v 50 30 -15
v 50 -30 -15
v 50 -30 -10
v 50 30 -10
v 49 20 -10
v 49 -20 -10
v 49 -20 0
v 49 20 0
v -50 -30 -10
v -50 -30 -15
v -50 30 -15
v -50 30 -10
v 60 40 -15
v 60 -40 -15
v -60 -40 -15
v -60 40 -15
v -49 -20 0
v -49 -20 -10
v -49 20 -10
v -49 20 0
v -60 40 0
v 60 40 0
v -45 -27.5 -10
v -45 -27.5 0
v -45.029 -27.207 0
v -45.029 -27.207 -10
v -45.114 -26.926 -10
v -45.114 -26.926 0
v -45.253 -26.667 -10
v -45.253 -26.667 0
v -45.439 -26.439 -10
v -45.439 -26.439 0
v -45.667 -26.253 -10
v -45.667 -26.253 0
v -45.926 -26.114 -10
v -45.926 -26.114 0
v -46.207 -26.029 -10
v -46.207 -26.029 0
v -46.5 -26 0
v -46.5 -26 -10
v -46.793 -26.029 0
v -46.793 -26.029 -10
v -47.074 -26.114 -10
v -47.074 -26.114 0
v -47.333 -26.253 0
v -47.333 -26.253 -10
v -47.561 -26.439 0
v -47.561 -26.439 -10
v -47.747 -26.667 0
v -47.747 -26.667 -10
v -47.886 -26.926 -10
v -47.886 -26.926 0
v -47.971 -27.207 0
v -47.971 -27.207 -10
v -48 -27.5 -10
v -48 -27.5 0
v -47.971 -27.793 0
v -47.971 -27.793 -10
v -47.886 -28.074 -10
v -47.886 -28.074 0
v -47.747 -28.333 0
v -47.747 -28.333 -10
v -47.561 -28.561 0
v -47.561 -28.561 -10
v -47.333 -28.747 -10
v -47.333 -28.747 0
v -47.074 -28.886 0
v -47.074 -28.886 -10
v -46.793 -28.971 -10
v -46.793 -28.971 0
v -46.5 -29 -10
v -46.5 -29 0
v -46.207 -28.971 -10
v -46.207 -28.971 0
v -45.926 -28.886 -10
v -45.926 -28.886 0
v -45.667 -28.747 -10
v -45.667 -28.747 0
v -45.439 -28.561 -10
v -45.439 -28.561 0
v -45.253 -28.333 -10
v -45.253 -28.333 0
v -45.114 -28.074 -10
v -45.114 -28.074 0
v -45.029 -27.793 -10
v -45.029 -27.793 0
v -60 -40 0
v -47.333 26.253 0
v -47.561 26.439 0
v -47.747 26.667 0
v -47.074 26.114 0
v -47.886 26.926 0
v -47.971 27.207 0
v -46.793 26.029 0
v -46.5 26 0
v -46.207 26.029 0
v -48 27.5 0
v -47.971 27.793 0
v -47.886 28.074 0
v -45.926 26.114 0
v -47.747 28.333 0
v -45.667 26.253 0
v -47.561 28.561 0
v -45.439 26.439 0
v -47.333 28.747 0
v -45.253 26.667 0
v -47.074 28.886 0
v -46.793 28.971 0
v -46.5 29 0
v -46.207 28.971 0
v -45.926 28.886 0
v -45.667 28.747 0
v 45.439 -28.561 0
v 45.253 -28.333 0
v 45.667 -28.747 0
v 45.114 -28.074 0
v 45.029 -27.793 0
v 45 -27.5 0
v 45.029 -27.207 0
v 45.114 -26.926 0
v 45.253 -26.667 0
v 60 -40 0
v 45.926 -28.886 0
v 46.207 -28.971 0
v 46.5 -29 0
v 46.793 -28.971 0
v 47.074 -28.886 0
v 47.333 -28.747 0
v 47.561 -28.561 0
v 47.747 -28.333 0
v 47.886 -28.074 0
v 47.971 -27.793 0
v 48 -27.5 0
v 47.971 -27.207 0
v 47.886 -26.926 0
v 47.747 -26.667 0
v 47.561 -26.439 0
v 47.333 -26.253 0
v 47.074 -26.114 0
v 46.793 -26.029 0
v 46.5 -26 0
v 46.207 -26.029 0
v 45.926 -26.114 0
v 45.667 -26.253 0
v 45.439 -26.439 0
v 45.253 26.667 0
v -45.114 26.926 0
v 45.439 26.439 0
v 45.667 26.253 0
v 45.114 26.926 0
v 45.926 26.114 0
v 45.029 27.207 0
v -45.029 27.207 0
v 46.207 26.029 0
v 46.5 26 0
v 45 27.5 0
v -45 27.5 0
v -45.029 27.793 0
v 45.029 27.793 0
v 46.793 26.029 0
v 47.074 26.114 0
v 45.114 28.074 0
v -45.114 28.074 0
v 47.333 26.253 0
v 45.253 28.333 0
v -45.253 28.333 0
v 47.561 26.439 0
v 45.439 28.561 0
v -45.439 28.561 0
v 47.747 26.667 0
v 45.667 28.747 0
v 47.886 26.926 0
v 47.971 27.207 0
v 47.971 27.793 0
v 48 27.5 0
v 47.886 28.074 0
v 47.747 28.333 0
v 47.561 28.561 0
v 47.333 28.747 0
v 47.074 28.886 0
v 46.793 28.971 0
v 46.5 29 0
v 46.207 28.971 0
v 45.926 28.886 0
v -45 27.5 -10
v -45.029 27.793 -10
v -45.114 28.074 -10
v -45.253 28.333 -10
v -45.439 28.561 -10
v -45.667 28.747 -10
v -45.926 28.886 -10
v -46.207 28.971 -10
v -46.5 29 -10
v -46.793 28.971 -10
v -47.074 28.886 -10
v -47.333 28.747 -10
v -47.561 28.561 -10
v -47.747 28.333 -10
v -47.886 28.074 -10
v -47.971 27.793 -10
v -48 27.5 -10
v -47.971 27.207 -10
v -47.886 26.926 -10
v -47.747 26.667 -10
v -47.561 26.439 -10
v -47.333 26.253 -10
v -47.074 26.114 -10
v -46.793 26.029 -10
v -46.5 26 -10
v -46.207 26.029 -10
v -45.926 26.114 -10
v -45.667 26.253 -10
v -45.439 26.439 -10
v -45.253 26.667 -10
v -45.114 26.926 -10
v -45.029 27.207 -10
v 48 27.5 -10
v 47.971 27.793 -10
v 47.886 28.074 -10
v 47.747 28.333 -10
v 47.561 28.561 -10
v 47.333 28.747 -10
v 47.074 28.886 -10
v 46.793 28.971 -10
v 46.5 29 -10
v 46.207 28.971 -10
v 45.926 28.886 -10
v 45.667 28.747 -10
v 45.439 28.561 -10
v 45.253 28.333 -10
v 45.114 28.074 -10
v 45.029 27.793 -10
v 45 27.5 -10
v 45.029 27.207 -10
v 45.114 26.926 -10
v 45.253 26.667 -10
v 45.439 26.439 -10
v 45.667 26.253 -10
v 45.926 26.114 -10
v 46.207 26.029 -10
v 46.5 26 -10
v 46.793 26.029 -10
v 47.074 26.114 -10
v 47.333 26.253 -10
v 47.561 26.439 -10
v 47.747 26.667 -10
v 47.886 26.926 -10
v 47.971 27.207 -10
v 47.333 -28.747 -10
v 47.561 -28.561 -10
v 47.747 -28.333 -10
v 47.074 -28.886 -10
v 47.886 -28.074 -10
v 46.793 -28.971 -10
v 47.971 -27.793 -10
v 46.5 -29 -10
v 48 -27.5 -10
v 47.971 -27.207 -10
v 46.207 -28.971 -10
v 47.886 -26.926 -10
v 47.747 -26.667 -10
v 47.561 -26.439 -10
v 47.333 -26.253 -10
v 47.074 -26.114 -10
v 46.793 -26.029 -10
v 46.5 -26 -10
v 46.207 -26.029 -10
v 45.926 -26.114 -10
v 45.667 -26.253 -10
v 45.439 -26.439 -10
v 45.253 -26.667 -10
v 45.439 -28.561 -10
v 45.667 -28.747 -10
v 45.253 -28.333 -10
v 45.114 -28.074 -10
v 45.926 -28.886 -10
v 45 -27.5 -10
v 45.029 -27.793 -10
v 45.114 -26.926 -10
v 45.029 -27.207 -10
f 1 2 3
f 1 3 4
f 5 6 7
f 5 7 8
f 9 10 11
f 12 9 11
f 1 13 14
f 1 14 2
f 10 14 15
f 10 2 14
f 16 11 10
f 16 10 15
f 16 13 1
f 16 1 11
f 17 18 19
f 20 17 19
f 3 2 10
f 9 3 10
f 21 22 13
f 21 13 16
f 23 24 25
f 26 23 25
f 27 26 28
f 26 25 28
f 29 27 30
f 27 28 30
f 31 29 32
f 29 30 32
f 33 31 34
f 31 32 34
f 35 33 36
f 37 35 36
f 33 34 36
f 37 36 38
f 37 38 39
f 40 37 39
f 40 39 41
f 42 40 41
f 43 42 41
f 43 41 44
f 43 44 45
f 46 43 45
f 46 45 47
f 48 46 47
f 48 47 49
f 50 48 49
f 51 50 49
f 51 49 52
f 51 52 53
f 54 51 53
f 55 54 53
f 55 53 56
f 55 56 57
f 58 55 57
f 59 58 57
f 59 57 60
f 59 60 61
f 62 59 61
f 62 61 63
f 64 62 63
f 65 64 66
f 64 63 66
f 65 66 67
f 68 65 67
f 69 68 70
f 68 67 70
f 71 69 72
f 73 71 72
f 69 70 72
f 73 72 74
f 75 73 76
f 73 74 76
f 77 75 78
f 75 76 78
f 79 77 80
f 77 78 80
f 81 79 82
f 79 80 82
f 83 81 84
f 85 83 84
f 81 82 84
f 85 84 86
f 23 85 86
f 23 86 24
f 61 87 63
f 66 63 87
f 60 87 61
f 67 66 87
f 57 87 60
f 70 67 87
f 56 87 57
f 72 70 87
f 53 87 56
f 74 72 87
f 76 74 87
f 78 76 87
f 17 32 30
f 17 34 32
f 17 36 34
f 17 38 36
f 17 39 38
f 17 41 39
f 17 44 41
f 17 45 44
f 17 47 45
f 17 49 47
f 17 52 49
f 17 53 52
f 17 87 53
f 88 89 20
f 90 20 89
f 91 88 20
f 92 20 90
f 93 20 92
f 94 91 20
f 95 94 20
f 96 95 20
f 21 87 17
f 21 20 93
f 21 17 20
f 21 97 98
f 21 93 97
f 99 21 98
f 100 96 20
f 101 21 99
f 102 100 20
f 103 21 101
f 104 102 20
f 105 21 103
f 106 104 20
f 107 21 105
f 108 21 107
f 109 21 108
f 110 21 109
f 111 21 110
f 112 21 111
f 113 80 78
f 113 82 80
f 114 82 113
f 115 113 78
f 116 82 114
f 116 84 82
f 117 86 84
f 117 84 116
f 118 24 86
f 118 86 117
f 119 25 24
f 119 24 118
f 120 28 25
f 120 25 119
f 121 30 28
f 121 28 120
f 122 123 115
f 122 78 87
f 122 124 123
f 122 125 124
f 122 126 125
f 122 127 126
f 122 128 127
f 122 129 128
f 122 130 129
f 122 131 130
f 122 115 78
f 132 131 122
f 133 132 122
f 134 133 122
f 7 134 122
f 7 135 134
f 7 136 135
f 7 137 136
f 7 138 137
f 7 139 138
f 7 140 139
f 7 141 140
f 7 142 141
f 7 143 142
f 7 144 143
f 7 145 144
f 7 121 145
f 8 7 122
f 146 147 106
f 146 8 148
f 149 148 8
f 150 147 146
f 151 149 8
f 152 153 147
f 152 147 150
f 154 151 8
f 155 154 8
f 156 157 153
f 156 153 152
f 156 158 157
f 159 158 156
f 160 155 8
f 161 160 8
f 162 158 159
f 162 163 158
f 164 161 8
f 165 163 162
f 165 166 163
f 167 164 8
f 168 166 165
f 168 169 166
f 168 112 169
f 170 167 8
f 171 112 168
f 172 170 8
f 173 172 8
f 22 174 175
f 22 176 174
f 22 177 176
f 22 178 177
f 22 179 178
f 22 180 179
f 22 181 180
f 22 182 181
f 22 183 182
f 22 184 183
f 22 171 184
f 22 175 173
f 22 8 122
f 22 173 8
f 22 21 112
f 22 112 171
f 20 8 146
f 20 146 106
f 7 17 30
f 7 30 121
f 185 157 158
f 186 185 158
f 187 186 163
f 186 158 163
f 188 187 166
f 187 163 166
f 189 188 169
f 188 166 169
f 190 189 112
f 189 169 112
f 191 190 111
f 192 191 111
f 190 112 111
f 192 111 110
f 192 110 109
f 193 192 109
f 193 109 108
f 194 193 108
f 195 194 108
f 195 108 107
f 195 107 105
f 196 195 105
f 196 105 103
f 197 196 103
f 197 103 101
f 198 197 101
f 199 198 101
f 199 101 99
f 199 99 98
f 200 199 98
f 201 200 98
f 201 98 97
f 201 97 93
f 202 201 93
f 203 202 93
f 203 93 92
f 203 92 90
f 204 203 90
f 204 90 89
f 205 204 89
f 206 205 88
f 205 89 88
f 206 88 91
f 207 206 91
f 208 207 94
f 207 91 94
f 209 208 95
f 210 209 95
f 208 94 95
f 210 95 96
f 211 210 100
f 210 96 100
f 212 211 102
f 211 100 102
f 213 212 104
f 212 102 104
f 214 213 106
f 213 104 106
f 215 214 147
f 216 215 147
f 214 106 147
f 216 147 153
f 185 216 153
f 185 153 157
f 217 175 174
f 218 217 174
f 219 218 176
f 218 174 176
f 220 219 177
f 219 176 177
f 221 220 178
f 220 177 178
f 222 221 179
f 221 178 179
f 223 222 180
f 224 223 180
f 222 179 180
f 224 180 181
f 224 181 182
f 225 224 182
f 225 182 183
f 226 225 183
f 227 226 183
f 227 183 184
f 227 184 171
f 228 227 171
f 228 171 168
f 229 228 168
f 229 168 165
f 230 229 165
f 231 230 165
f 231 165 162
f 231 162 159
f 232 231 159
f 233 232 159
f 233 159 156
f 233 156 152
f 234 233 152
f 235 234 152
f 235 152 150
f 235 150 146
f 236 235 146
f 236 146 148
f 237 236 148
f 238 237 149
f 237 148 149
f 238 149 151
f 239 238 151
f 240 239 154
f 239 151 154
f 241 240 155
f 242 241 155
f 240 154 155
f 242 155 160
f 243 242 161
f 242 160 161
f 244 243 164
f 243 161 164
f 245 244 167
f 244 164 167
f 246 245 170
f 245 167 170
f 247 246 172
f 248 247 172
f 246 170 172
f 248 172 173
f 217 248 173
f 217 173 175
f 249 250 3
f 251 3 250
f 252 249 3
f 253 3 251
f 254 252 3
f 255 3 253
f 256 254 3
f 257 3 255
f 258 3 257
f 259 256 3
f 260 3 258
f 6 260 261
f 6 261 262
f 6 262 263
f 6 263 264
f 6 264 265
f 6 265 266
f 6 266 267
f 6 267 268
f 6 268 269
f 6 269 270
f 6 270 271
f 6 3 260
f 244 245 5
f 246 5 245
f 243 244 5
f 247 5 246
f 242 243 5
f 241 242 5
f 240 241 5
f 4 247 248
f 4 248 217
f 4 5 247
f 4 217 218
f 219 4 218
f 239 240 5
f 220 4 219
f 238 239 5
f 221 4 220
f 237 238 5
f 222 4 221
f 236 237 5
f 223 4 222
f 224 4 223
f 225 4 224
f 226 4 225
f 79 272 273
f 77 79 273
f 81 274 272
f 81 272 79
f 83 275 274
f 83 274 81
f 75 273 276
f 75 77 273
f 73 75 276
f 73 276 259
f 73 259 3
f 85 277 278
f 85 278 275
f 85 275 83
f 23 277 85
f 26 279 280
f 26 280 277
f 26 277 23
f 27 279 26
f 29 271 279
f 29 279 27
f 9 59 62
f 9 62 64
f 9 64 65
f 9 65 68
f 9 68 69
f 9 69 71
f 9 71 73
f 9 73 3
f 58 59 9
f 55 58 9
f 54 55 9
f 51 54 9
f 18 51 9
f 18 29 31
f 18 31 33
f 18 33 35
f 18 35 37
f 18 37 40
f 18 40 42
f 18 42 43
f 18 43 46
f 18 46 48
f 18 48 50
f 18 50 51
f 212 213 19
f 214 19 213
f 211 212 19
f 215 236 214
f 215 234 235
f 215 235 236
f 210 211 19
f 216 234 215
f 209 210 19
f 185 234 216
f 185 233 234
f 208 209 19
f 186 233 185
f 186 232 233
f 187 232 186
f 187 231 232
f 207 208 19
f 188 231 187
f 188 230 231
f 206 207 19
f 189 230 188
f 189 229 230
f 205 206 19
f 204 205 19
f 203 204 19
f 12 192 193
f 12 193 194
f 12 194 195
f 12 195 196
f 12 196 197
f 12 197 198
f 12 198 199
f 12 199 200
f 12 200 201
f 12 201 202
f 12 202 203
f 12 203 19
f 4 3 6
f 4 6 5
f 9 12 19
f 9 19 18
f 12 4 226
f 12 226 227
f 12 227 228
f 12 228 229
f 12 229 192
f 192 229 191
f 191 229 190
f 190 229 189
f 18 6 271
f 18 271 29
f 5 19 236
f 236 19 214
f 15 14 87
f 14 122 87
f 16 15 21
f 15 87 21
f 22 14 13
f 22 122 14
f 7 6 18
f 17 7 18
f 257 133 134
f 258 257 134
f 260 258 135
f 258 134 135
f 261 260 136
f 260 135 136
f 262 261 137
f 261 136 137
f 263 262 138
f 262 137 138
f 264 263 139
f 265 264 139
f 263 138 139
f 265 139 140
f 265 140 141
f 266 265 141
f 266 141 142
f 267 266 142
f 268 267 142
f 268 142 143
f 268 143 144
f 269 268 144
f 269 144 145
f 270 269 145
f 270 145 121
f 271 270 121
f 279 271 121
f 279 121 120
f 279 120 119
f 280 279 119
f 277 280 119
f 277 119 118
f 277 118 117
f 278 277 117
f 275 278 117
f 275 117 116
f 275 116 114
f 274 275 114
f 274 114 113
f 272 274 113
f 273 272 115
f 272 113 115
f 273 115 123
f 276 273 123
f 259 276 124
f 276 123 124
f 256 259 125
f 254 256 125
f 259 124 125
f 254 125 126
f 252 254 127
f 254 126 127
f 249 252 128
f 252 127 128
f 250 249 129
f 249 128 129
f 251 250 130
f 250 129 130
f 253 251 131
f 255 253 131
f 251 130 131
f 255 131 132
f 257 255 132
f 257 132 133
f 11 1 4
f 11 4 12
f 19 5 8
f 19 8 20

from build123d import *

# Parameters (mm, degrees)
SKETCH1_W           = 120
SKETCH1_H           = 80
BOSS_EXTRUDE1_DEPTH = 10
SKETCH2_W           = 98
SKETCH2_H           = 40
CUT_EXTRUDE2_DEPTH  = 15
SKETCH4_R           = 1.5
CUT_EXTRUDE3_DEPTH  = 15
SKETCH5_W           = 120
SKETCH5_H           = 80
BOSS_EXTRUDE2_DEPTH = 5
SKETCH6_W           = 100
SKETCH6_H           = 60
CUT_EXTRUDE5_DEPTH  = 5


with BuildPart() as part:
    # Sketch1 → Boss-Extrude1 (new body)
    with BuildSketch(Plane.XY):
        Rectangle(SKETCH1_W, SKETCH1_H)
    extrude(amount=-BOSS_EXTRUDE1_DEPTH)

    # Sketch2 → Cut-Extrude2 (cut)
    with BuildSketch(Plane(origin=(0, 0, -10), x_dir=(-1, 0, 0), z_dir=(0, 0, -1))):
        Rectangle(SKETCH2_W, SKETCH2_H)
    extrude(amount=-CUT_EXTRUDE2_DEPTH, mode=Mode.SUBTRACT)

    # Sketch4 → Cut-Extrude3 (cut)
    with BuildSketch(Plane.XY):
        with Locations((-46.5, 27.5)):
            Circle(SKETCH4_R)
        with Locations((46.5, 27.5)):
            Circle(SKETCH4_R)
        with Locations((46.5, -27.5)):
            Circle(SKETCH4_R)
        with Locations((-46.5, -27.5)):
            Circle(SKETCH4_R)
    extrude(amount=-CUT_EXTRUDE3_DEPTH, mode=Mode.SUBTRACT)

    # Sketch5 → Boss-Extrude2 (add)
    with BuildSketch(Plane(origin=(0, 0, -10), x_dir=(-1, 0, 0), z_dir=(0, 0, -1))):
        Rectangle(SKETCH5_W, SKETCH5_H)
    extrude(amount=BOSS_EXTRUDE2_DEPTH)

    # Sketch6 → Cut-Extrude5 (cut)
    with BuildSketch(Plane(origin=(0, 0, -15), x_dir=(-1, 0, 0), z_dir=(0, 0, -1))):
        Rectangle(SKETCH6_W, SKETCH6_H)
    extrude(amount=-CUT_EXTRUDE5_DEPTH, mode=Mode.SUBTRACT)


solid = part.part
